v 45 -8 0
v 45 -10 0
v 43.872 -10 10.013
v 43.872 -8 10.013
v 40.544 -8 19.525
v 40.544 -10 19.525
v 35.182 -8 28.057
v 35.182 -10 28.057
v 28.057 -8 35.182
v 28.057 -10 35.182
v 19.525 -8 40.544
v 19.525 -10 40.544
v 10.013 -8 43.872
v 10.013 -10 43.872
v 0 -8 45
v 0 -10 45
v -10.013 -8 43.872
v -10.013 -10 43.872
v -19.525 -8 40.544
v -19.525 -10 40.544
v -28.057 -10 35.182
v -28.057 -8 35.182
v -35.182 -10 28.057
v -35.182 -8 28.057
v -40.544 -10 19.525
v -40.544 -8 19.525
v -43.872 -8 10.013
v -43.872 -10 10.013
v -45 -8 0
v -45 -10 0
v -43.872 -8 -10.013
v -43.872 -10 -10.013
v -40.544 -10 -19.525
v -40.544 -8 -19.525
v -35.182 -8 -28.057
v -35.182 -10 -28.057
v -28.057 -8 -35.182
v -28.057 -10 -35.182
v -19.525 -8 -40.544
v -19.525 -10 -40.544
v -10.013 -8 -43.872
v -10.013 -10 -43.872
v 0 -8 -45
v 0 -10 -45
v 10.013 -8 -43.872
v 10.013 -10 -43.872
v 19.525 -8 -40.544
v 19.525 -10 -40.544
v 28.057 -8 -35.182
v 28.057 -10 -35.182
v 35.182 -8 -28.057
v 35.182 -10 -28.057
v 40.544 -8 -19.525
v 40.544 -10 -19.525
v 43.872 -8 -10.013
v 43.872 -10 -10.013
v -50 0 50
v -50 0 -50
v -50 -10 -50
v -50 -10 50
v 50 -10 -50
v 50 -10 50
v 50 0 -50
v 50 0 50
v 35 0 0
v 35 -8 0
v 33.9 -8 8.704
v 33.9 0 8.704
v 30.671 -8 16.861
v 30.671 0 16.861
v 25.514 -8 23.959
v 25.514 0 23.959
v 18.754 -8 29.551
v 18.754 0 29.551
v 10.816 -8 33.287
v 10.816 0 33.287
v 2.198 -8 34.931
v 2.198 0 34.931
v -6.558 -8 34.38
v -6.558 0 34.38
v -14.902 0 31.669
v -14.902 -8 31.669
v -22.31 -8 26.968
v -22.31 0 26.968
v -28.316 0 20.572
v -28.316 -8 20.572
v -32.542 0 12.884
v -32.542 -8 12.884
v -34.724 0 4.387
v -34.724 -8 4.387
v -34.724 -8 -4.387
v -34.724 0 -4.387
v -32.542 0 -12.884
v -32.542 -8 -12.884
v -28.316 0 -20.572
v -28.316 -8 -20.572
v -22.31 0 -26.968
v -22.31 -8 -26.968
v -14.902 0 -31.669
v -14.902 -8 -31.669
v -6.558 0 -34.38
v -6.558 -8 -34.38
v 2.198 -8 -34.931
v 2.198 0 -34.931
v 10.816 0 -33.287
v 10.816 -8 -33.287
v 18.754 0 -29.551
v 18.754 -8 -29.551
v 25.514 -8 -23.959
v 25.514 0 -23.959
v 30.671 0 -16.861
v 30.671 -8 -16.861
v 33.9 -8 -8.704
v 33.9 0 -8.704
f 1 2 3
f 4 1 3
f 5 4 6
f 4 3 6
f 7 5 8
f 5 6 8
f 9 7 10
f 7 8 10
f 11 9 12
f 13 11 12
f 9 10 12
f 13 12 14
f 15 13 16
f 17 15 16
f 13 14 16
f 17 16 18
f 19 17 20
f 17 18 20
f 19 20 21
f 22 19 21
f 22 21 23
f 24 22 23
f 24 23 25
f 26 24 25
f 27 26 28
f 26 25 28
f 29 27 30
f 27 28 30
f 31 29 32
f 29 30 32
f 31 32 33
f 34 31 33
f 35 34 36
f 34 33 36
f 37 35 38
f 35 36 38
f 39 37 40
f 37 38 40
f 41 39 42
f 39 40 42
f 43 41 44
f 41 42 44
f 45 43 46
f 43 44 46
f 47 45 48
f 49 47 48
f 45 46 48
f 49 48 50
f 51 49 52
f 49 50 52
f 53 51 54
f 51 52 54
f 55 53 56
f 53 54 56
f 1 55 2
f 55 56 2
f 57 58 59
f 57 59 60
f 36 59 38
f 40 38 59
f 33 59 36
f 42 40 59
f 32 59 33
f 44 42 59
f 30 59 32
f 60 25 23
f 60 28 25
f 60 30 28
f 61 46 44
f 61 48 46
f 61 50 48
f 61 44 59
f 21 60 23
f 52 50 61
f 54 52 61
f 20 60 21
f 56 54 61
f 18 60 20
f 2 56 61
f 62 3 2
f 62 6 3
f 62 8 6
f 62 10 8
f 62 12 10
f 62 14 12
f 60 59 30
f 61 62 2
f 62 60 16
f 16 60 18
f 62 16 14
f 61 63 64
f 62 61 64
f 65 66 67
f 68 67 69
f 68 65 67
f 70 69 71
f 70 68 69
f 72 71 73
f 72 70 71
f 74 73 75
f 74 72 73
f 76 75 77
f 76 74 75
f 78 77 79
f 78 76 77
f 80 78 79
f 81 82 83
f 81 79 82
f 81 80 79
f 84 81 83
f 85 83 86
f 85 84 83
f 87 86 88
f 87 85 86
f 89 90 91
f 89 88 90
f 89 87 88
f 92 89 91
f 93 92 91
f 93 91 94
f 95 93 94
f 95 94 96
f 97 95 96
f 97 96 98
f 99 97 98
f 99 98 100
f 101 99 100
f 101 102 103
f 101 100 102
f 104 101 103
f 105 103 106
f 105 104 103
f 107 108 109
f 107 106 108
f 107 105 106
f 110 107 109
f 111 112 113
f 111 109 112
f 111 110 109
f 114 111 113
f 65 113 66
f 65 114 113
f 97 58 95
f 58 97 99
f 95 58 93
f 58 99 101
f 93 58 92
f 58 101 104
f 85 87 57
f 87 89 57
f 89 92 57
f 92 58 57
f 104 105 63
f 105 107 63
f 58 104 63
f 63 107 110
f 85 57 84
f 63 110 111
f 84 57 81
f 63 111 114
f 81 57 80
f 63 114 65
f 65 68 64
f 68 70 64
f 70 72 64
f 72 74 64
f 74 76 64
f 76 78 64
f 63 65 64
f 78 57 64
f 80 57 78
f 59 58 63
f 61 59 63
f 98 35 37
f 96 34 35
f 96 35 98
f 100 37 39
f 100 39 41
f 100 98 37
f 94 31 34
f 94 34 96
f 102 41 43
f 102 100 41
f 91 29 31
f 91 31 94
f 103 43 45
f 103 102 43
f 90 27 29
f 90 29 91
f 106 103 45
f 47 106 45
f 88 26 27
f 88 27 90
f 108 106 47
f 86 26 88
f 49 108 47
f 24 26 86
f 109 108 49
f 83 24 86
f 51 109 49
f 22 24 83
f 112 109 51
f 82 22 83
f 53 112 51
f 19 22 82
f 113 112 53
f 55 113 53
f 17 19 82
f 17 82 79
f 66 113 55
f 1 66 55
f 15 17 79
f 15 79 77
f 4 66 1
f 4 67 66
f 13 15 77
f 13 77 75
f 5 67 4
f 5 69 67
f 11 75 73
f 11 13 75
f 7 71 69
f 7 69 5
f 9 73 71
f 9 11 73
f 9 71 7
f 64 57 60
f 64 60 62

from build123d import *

# Parameters (mm, degrees)
F0_W     = 100
F0_H     = 100
F0_R     = 35
F1_DEPTH = 10
F2_R     = 45
F3_DEPTH = 2


with BuildPart() as f1:
    # F0 (on Front) → F1 (new body)
    with BuildSketch(Plane.XZ):
        Rectangle(F0_W, F0_H)
        Circle(F0_R, mode=Mode.SUBTRACT)
    extrude(amount=F1_DEPTH)

    # F2 (on face) → F3 (cut)
    with BuildSketch(Plane.XZ.offset(10)):
        Circle(F2_R)
    extrude(amount=-F3_DEPTH, mode=Mode.SUBTRACT)


solid = f1.part
